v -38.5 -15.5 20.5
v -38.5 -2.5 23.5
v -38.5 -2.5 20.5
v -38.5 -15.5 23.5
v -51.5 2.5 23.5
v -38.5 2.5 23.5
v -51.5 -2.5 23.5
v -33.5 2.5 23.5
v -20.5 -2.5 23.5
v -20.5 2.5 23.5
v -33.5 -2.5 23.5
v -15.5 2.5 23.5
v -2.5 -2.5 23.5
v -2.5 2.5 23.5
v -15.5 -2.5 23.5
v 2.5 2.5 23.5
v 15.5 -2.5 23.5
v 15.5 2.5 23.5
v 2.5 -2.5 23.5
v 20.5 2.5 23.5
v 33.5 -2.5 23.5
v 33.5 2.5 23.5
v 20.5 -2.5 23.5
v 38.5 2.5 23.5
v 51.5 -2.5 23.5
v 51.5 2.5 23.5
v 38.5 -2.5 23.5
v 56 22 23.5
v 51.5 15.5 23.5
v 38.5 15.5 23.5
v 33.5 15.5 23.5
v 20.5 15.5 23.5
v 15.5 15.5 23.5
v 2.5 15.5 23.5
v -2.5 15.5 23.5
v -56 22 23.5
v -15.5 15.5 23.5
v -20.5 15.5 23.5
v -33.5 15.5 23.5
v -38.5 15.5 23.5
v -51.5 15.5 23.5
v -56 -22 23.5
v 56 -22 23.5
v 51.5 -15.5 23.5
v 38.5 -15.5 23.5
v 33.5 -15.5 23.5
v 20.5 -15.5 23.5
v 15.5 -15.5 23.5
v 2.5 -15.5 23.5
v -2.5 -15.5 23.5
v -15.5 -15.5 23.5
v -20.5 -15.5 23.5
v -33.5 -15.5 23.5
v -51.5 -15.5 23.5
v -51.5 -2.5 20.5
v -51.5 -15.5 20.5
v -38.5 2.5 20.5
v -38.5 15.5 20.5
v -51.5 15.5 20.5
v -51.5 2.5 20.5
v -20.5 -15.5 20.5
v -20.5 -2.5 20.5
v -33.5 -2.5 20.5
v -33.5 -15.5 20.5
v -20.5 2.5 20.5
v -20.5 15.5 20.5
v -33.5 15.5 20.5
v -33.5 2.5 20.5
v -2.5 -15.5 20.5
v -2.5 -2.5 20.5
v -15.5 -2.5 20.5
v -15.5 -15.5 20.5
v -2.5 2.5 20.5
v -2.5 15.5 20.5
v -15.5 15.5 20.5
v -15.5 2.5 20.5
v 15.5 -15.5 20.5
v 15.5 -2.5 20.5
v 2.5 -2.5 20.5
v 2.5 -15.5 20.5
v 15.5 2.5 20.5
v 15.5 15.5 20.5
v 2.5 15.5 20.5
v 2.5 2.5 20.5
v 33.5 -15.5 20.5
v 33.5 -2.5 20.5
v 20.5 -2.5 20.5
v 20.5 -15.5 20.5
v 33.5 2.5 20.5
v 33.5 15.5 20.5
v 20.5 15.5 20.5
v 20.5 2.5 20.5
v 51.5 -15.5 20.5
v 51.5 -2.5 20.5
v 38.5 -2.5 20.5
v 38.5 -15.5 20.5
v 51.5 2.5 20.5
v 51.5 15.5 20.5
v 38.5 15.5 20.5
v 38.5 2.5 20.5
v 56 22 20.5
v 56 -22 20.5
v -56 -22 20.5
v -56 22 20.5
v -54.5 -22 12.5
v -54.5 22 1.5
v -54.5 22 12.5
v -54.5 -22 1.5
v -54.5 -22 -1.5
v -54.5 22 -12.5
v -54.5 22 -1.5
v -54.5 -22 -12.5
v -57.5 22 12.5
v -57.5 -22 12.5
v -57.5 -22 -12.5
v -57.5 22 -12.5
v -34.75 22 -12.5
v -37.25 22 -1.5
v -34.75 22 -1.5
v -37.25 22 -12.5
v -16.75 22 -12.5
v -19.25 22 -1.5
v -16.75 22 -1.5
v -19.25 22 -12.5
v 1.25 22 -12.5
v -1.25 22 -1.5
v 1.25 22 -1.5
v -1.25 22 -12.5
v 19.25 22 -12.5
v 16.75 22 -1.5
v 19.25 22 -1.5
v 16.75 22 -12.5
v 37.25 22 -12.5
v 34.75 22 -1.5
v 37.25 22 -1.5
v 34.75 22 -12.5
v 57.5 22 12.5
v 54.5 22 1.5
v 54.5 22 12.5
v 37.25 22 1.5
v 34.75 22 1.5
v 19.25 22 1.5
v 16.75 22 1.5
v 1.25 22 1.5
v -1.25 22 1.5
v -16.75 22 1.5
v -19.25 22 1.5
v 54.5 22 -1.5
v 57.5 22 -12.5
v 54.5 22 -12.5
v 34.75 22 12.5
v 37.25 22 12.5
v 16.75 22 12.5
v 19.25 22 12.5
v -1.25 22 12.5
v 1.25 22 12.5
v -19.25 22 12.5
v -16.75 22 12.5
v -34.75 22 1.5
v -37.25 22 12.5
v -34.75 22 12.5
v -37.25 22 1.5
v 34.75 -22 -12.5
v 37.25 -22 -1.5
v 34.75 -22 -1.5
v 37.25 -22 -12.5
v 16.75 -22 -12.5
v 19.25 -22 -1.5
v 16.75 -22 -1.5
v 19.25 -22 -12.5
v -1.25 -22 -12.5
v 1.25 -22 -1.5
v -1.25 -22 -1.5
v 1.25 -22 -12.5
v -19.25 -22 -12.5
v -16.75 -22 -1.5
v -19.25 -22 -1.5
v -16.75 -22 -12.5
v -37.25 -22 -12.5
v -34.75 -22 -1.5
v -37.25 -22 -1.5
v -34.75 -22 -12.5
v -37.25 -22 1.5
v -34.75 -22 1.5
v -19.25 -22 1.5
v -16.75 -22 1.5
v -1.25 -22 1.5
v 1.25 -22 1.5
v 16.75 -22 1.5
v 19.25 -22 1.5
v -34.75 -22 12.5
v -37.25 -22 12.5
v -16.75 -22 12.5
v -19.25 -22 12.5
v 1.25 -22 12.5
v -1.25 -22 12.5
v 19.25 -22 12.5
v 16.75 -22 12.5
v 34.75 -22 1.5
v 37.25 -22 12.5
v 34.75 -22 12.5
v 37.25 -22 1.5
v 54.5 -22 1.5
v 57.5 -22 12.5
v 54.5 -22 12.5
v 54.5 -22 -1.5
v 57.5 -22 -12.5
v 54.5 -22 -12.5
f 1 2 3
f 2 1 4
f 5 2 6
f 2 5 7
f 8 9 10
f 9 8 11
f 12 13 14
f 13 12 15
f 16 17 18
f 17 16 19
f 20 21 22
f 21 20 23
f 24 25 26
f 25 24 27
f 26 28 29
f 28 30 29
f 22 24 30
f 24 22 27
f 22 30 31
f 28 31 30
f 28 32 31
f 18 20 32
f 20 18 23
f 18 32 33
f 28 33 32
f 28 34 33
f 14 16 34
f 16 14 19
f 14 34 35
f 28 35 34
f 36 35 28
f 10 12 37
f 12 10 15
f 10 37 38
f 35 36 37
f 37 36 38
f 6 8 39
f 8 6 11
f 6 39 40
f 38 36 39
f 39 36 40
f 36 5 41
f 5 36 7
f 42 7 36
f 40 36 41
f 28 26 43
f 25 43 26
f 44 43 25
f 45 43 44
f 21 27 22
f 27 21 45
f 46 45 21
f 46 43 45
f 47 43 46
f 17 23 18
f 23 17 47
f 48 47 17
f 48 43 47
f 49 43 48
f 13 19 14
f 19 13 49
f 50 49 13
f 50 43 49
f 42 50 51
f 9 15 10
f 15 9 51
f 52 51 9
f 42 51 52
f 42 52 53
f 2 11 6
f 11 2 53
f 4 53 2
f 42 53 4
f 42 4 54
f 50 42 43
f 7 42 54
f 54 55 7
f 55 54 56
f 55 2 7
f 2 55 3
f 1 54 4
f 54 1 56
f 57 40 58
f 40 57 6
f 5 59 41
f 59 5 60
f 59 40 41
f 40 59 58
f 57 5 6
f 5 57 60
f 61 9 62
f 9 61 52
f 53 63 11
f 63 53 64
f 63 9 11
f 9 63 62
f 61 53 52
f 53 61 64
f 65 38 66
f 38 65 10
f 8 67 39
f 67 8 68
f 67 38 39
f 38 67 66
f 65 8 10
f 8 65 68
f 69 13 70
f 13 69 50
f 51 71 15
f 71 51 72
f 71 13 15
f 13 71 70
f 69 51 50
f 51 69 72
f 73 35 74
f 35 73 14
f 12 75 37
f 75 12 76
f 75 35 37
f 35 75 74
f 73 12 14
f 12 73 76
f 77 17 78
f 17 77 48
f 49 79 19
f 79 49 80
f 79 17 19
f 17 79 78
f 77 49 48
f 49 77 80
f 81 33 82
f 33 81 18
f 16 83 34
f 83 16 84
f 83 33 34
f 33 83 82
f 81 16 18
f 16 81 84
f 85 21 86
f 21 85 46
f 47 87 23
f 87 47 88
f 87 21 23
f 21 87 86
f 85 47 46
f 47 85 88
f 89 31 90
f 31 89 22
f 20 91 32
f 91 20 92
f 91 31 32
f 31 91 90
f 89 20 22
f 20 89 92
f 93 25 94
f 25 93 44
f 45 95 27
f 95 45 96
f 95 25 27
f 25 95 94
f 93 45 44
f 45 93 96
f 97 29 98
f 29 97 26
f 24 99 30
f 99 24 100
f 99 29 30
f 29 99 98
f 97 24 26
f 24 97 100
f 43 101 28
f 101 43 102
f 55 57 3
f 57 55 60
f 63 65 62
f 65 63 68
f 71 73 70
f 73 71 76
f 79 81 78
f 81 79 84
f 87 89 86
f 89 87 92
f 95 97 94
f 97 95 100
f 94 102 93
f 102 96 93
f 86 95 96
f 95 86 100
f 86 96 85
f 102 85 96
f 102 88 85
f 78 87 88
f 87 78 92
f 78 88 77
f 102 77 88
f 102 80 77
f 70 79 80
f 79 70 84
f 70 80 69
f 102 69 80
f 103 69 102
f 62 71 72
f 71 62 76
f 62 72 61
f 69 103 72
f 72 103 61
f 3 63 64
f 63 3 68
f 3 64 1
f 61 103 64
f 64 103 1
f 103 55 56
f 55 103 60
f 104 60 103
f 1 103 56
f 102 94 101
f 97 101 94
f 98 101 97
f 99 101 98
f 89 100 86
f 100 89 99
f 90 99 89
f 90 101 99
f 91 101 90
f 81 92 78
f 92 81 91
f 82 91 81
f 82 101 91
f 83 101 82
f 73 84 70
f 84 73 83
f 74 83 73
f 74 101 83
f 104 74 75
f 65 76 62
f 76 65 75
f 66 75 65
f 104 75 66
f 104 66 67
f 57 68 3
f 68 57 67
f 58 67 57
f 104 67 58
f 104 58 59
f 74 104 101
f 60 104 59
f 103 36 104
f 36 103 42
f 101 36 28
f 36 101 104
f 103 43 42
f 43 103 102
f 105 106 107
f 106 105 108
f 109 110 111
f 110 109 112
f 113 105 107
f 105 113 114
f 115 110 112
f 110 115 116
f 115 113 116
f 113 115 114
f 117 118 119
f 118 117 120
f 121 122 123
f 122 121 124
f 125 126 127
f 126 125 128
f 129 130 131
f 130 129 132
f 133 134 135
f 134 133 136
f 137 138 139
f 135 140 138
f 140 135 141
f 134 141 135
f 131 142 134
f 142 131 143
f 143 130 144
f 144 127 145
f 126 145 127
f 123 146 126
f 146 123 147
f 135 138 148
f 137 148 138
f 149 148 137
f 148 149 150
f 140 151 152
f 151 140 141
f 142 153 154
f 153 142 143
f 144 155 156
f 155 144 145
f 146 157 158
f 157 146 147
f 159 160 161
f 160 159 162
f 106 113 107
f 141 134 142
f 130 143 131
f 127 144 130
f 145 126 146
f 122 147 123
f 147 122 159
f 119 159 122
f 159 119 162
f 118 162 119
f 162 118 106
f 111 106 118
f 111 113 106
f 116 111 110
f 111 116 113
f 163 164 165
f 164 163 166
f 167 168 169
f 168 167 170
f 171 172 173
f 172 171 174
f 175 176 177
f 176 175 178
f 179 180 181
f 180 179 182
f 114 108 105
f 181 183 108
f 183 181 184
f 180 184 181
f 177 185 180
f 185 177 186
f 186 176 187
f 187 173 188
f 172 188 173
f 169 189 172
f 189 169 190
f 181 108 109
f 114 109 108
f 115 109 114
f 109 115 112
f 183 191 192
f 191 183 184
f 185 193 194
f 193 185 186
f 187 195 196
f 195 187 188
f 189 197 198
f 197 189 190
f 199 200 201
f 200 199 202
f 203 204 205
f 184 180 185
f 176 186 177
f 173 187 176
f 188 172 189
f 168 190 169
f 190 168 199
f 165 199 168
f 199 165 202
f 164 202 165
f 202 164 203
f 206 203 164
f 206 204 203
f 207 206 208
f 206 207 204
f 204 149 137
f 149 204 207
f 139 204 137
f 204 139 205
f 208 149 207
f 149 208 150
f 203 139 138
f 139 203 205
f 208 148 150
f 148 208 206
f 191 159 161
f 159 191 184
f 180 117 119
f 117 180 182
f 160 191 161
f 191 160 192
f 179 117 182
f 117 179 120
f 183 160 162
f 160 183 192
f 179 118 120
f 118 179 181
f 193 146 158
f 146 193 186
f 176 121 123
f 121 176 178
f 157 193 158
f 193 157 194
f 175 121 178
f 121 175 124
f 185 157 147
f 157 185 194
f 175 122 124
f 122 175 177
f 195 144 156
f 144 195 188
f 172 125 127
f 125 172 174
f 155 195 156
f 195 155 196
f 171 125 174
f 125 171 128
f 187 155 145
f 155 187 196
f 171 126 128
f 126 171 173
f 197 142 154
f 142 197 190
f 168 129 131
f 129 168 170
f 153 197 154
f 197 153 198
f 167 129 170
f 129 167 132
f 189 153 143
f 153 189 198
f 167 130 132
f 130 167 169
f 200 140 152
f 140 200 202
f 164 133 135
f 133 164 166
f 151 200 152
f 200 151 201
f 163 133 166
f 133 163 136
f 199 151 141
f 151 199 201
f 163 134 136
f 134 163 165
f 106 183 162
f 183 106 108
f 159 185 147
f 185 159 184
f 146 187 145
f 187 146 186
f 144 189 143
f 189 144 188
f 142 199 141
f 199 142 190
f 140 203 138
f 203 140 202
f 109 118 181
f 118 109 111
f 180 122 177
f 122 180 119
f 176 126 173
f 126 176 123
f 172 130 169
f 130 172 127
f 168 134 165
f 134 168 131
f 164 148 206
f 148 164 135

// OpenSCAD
// 12-cuvette rack, printed standing on its base (z = 0 to 25)
// All dimensions in mm, taken from the user's caliper measurements.

$fn = 64;

// Base & deck plates
base_x = 112;   // X length of base plate
base_y = 44;    // Y depth of base plate
base_t = 3;     // base plate thickness (z 0..3)
deck_t = 3;     // deck plate thickness (z 22..25)
deck_z = 22;    // bottom of deck plate

// Upright walls (z 0..25, full Y depth)
wall_h = 25;    // total wall height
end_w  = 3;     // end-wall thickness (X)
rib_w  = 2.5;   // rib thickness (X)
rib_x  = [-36, -18, 0, 18, 36]; // rib centre X positions

// Deck through-holes
hole_s = 13;    // square hole side (13 x 13)
pitch  = 18;    // centre-to-centre spacing in both X and Y
rows_y = 2;     // rows along Y
cols_x = 6;     // columns along X

// ---- Base plate (z 0..3) ----
module base() { translate([0, 0, 0])
    cube([base_x, base_y, base_t], center = true); }

// ---- Deck plate (z 22..25) with 12 square through-holes ----
module deck() { translate([0, 0, deck_z])
    difference() {
        cube([base_x, base_y, deck_t], center = true);
        for (i = [0 : cols_x - 1]) {
            for (j = [0 : rows_y - 1]) {
                hx = (i - (cols_x - 1) / 2) * pitch;
                hy = (j - (rows_y - 1) / 2) * pitch;
                translate([hx, hy, -1])
                    cube([hole_s, hole_s, deck_t + 2], center = true);
            }
        }
    } }

// ---- Upright walls (z 0..25, full Y depth) ----
module walls() { union() {
    // Two 3 mm end walls flush with the short ends (x = ±56)
    for (ex = [-base_x / 2, base_x / 2]) {
        translate([ex, 0, 0])
            cube([end_w, base_y, wall_h], center = true);
    }
    // Five 2.5 mm ribs at the given X centres
    for (rx = rib_x) {
        translate([rx, 0, 0])
            cube([rib_w, base_y, wall_h], center = true);
    }
} }

// ---- Assemble the rack ----
union() {
    base();
    deck();
    walls();
}
